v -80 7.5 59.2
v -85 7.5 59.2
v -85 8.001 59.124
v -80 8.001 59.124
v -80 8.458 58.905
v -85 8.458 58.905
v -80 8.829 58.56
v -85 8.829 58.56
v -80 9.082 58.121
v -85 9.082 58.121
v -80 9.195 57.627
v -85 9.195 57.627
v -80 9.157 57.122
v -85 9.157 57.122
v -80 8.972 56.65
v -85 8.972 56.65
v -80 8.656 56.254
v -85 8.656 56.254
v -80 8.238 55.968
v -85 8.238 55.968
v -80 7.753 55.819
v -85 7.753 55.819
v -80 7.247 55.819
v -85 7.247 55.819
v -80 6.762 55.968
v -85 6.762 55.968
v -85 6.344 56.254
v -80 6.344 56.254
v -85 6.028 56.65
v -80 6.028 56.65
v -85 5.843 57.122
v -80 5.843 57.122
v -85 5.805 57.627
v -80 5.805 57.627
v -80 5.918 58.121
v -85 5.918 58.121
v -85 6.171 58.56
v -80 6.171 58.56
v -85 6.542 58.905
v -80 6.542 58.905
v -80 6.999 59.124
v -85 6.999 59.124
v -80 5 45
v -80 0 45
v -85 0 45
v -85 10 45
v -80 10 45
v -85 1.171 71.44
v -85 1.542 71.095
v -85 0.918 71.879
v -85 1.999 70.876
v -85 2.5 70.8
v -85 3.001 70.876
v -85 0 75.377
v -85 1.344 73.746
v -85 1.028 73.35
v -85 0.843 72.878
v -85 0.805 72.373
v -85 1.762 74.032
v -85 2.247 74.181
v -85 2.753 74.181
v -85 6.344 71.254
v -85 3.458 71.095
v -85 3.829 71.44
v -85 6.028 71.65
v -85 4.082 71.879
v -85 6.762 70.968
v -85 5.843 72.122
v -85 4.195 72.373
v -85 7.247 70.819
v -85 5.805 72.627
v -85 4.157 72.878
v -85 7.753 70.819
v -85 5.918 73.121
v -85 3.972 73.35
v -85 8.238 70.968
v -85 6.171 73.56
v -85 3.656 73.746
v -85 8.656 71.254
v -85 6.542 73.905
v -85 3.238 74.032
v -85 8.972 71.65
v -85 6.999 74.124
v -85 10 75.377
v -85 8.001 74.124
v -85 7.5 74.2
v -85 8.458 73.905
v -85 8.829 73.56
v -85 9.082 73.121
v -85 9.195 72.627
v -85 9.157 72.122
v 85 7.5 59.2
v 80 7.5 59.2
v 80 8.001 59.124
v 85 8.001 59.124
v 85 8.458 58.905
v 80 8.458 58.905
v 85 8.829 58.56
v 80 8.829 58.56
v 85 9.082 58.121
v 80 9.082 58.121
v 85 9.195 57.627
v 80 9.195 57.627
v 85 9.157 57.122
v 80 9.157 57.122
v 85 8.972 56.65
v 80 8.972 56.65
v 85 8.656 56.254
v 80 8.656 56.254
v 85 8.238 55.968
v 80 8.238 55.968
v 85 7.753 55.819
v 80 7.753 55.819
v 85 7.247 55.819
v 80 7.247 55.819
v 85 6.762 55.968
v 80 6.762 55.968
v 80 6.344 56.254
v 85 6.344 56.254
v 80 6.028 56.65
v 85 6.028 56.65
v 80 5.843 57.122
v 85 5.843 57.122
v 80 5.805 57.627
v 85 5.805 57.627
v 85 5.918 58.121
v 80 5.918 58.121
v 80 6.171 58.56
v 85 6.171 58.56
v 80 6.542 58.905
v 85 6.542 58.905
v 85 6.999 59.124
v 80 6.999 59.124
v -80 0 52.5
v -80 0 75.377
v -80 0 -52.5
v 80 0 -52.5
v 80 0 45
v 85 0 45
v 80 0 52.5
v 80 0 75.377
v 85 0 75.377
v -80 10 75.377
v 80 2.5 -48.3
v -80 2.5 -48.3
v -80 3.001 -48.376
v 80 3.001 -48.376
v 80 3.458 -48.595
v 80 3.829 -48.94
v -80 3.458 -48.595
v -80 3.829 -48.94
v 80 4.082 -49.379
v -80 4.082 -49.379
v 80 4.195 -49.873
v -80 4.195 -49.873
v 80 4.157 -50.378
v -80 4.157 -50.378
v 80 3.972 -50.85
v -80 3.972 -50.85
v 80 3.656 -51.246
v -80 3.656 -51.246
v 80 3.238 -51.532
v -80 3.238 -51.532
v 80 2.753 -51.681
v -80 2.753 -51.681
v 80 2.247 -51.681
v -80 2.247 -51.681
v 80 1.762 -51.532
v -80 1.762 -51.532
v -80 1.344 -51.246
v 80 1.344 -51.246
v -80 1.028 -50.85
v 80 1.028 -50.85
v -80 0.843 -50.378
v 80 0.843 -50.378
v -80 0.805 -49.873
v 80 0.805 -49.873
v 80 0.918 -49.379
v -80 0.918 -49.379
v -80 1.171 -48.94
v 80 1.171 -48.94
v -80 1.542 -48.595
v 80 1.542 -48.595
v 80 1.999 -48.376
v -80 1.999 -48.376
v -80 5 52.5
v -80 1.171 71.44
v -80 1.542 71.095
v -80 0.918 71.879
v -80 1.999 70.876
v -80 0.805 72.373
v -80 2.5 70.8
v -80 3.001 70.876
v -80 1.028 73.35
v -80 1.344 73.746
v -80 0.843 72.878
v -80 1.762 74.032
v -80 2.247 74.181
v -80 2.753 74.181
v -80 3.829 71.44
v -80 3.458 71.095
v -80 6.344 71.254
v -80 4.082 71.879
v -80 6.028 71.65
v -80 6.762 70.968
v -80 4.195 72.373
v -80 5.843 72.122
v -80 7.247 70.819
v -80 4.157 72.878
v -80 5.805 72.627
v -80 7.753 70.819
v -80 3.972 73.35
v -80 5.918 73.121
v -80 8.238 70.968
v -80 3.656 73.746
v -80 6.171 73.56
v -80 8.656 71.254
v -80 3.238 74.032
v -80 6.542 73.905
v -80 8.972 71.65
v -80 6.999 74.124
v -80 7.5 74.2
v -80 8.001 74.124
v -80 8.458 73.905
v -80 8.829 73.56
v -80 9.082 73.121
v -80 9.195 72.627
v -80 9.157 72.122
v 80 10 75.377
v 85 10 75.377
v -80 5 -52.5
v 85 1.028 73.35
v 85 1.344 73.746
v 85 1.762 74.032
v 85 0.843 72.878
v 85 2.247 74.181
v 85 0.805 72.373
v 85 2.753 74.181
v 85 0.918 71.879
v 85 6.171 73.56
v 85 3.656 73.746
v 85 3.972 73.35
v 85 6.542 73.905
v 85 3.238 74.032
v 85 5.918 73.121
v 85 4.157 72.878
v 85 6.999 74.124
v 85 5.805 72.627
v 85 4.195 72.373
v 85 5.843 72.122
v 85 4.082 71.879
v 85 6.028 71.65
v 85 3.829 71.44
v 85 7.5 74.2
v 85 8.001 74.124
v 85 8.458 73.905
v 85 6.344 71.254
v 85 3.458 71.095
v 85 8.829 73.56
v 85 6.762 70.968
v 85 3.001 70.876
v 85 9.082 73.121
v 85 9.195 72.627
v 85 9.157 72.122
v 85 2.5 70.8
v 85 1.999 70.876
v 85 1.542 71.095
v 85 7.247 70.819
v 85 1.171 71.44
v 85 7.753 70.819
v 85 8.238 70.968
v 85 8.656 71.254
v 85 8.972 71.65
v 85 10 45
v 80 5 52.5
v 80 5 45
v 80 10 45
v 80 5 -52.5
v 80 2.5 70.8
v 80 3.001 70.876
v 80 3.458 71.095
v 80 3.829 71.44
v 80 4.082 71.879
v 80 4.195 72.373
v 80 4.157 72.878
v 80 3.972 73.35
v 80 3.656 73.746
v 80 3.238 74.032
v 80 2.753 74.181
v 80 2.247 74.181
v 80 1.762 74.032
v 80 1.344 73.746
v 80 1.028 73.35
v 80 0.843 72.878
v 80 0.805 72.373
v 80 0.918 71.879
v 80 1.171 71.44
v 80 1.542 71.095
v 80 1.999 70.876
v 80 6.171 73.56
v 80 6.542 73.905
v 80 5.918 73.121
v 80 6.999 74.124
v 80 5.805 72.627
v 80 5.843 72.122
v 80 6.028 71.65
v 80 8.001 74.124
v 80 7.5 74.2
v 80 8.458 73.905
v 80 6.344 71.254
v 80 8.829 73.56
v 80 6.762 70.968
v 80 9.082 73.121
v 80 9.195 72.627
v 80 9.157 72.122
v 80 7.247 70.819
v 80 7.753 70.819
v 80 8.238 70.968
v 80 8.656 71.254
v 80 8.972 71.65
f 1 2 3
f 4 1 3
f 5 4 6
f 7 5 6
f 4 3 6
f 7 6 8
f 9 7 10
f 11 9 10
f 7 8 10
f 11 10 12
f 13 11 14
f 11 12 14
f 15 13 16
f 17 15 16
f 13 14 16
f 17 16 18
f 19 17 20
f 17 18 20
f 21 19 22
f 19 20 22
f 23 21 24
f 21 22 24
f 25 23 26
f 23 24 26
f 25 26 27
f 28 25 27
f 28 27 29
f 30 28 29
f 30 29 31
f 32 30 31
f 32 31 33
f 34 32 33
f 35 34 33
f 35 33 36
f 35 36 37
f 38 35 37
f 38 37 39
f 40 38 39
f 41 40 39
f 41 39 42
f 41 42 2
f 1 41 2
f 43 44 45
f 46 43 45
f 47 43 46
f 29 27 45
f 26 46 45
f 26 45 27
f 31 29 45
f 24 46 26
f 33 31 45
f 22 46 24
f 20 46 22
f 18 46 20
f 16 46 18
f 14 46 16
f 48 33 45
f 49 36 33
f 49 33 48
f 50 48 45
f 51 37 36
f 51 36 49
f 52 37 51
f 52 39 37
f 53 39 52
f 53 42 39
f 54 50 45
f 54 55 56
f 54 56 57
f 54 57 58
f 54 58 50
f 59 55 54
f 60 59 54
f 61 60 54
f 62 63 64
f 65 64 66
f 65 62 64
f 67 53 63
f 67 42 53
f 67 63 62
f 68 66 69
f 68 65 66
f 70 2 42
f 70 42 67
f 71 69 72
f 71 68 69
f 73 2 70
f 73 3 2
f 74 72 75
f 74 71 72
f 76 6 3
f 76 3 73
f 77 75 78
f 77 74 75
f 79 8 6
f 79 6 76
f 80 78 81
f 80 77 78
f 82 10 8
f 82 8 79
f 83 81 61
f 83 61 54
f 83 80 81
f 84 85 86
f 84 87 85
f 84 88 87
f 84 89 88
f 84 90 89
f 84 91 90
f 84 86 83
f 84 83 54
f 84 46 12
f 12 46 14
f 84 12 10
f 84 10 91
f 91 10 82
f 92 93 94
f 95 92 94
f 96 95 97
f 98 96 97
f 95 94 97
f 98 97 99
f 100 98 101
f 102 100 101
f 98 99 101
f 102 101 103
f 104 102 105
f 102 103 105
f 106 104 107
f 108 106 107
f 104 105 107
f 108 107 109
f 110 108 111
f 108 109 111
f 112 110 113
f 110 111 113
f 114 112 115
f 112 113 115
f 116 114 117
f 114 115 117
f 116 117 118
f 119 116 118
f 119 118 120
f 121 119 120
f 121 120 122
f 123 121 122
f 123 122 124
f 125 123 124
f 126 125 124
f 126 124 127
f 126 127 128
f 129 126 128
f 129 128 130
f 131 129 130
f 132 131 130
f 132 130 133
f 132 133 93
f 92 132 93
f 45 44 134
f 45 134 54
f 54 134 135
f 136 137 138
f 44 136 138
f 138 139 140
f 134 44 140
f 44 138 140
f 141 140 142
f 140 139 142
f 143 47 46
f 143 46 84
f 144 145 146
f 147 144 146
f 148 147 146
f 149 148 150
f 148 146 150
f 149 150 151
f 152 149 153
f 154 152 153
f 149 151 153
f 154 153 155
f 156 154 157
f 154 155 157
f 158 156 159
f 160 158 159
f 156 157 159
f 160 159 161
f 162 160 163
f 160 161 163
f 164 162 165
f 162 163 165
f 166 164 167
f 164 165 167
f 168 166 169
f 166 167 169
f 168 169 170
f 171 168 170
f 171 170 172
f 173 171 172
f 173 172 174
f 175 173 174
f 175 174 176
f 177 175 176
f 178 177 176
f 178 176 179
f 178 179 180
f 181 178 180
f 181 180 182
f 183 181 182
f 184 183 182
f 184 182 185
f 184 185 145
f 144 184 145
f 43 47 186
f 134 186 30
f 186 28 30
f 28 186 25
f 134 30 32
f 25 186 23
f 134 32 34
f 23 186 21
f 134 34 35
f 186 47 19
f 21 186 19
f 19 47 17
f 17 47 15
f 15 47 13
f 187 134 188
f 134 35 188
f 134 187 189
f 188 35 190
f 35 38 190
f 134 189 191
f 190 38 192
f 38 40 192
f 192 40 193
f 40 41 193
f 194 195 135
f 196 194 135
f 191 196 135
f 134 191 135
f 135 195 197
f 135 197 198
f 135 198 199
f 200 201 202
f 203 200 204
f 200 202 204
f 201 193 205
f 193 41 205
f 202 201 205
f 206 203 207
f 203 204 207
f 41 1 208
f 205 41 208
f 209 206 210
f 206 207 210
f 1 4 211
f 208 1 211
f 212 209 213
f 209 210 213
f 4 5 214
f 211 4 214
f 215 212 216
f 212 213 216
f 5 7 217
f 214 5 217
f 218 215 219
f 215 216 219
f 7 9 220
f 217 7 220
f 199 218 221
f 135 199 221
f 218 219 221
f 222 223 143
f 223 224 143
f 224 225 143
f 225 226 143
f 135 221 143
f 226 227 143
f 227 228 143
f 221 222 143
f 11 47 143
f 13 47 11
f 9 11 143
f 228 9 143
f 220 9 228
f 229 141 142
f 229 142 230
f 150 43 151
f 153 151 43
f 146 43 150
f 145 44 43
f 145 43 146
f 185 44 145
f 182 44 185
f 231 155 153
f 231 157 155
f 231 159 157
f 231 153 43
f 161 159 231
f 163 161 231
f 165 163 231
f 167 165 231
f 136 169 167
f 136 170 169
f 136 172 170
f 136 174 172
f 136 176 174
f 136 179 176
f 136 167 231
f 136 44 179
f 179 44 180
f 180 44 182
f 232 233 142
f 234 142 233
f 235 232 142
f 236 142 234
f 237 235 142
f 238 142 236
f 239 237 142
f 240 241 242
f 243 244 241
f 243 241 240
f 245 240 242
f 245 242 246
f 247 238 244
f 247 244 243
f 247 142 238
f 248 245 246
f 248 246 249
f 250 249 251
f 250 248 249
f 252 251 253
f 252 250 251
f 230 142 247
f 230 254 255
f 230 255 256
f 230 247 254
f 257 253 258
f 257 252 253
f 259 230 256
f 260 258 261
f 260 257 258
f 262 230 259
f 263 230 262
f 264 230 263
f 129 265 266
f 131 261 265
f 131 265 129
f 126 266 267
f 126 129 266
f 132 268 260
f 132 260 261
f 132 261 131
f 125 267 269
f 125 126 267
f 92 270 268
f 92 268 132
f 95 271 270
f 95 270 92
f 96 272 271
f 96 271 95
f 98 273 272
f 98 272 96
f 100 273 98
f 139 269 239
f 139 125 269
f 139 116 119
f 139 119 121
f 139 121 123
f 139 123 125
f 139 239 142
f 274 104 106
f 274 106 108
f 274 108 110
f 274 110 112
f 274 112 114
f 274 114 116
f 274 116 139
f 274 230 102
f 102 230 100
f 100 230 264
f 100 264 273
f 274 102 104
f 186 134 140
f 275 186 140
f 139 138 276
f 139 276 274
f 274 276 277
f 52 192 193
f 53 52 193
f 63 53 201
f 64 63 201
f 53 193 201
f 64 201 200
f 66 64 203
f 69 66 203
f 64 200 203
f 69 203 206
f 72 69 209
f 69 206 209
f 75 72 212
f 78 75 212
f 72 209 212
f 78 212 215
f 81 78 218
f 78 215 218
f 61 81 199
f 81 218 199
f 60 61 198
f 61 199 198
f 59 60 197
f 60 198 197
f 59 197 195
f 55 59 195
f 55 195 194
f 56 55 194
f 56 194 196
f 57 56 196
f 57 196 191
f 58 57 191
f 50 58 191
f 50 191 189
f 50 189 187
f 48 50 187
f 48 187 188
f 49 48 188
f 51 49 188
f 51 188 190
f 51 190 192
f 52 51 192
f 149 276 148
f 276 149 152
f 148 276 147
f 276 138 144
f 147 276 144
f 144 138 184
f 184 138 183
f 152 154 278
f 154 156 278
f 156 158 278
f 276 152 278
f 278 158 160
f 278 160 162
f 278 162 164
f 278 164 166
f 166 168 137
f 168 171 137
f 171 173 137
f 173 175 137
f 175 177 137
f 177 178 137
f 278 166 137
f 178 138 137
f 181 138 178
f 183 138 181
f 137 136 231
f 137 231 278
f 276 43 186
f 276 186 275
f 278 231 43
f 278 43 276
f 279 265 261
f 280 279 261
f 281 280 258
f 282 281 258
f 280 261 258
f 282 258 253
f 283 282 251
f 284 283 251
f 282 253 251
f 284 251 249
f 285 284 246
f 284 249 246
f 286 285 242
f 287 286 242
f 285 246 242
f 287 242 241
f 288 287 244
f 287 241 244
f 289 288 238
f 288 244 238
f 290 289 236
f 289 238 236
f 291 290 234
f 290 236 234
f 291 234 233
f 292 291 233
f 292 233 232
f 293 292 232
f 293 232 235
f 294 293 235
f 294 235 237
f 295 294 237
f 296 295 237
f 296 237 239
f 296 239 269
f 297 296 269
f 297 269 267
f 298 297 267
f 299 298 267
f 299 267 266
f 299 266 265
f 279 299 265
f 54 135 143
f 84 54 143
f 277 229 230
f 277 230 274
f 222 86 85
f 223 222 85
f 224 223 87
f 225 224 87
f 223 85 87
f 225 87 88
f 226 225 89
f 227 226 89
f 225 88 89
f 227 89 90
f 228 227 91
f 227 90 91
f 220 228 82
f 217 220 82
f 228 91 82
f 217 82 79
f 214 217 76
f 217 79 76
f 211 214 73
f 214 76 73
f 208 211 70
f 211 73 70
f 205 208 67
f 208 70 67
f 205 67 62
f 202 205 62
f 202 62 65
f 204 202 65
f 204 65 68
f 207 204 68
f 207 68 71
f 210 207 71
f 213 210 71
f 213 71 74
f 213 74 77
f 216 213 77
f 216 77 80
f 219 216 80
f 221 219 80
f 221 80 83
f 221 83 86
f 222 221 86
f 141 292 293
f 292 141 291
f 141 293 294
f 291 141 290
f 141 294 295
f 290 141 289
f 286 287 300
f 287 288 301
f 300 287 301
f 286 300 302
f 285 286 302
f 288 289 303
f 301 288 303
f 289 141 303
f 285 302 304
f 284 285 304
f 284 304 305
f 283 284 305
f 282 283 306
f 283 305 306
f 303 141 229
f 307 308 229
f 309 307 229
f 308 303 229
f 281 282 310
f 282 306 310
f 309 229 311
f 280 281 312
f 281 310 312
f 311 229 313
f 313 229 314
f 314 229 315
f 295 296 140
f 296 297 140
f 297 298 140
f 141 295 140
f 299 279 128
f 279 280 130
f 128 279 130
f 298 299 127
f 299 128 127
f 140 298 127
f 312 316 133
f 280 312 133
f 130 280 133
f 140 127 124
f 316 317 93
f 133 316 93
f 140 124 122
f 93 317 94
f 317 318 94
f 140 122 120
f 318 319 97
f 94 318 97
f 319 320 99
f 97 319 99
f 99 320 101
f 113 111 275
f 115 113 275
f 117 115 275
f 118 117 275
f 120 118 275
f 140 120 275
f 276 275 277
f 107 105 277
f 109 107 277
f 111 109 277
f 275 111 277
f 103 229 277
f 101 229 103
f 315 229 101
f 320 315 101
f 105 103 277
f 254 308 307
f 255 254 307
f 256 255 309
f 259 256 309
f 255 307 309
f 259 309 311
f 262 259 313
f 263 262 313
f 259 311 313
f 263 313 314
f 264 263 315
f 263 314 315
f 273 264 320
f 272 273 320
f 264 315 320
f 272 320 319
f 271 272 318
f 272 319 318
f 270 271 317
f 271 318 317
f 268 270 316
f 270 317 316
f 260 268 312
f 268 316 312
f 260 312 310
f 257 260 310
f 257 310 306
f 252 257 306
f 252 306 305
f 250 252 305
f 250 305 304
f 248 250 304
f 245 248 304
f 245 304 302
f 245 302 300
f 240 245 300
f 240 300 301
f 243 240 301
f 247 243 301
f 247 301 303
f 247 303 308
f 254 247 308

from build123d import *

# Parameters (mm, degrees)
SKETCH_1_W          = 160
SKETCH_1_H          = 105
EXTRUDE_1_DEPTH     = 5
SKETCH_3_W          = 30.377017425
SKETCH_3_H          = 10
EXTRUDE_3_DEPTH     = 5
SKETCH_4_W          = 30.377017425
SKETCH_4_H          = 10
EXTRUDE_4_DEPTH     = 5
SKETCH_5_R          = 1.7
CUT_EXTRUDE_1_DEPTH = 200
SKETCH_6_R          = 1.7
CUT_EXTRUDE_3_DEPTH = 200
SKETCH_7_R          = 1.7
CUT_EXTRUDE_4_DEPTH = 200


with BuildPart() as part:
    # 草图1 → 凸台-拉伸1 (new body)
    with BuildSketch(Plane(origin=(0, 0, 0), x_dir=(1, 0, 0), z_dir=(0, 1, 0))):
        Rectangle(SKETCH_1_W, SKETCH_1_H)
    extrude(amount=EXTRUDE_1_DEPTH)

    # 草图3 → 凸台-拉伸3 (add)
    with BuildSketch(Plane(origin=(80, 0, 0), x_dir=(0, 0, -1), z_dir=(1, 0, 0))):
        with Locations((-60.188508713, 5)):
            Rectangle(SKETCH_3_W, SKETCH_3_H)
    extrude(amount=EXTRUDE_3_DEPTH)

    # 草图4 → 凸台-拉伸4 (add)
    with BuildSketch(Plane.ZY.offset(80)):
        with Locations((60.188508713, 5)):
            Rectangle(SKETCH_4_W, SKETCH_4_H)
    extrude(amount=EXTRUDE_4_DEPTH)

    # 草图5 → 切除-拉伸1 (cut)
    with BuildSketch(Plane.ZY.offset(80)):
        with Locations((-50, 2.5)):
            Circle(SKETCH_5_R)
    extrude(amount=-CUT_EXTRUDE_1_DEPTH, mode=Mode.SUBTRACT)

    # 草图6 → 切除-拉伸3 (cut)
    with BuildSketch(Plane.ZY.offset(85)):
        with Locations((57.5, 7.5)):
            Circle(SKETCH_6_R)
        with Locations((72.5, 7.5)):
            Circle(SKETCH_6_R)
    extrude(amount=-CUT_EXTRUDE_3_DEPTH, mode=Mode.SUBTRACT)

    # 草图7 → 切除-拉伸4 (cut)
    with BuildSketch(Plane(origin=(85, 0, 0), x_dir=(0, 0, -1), z_dir=(1, 0, 0))):
        with Locations((-72.5, 2.5)):
            Circle(SKETCH_7_R)
    extrude(amount=-CUT_EXTRUDE_4_DEPTH, mode=Mode.SUBTRACT)


solid = part.part
